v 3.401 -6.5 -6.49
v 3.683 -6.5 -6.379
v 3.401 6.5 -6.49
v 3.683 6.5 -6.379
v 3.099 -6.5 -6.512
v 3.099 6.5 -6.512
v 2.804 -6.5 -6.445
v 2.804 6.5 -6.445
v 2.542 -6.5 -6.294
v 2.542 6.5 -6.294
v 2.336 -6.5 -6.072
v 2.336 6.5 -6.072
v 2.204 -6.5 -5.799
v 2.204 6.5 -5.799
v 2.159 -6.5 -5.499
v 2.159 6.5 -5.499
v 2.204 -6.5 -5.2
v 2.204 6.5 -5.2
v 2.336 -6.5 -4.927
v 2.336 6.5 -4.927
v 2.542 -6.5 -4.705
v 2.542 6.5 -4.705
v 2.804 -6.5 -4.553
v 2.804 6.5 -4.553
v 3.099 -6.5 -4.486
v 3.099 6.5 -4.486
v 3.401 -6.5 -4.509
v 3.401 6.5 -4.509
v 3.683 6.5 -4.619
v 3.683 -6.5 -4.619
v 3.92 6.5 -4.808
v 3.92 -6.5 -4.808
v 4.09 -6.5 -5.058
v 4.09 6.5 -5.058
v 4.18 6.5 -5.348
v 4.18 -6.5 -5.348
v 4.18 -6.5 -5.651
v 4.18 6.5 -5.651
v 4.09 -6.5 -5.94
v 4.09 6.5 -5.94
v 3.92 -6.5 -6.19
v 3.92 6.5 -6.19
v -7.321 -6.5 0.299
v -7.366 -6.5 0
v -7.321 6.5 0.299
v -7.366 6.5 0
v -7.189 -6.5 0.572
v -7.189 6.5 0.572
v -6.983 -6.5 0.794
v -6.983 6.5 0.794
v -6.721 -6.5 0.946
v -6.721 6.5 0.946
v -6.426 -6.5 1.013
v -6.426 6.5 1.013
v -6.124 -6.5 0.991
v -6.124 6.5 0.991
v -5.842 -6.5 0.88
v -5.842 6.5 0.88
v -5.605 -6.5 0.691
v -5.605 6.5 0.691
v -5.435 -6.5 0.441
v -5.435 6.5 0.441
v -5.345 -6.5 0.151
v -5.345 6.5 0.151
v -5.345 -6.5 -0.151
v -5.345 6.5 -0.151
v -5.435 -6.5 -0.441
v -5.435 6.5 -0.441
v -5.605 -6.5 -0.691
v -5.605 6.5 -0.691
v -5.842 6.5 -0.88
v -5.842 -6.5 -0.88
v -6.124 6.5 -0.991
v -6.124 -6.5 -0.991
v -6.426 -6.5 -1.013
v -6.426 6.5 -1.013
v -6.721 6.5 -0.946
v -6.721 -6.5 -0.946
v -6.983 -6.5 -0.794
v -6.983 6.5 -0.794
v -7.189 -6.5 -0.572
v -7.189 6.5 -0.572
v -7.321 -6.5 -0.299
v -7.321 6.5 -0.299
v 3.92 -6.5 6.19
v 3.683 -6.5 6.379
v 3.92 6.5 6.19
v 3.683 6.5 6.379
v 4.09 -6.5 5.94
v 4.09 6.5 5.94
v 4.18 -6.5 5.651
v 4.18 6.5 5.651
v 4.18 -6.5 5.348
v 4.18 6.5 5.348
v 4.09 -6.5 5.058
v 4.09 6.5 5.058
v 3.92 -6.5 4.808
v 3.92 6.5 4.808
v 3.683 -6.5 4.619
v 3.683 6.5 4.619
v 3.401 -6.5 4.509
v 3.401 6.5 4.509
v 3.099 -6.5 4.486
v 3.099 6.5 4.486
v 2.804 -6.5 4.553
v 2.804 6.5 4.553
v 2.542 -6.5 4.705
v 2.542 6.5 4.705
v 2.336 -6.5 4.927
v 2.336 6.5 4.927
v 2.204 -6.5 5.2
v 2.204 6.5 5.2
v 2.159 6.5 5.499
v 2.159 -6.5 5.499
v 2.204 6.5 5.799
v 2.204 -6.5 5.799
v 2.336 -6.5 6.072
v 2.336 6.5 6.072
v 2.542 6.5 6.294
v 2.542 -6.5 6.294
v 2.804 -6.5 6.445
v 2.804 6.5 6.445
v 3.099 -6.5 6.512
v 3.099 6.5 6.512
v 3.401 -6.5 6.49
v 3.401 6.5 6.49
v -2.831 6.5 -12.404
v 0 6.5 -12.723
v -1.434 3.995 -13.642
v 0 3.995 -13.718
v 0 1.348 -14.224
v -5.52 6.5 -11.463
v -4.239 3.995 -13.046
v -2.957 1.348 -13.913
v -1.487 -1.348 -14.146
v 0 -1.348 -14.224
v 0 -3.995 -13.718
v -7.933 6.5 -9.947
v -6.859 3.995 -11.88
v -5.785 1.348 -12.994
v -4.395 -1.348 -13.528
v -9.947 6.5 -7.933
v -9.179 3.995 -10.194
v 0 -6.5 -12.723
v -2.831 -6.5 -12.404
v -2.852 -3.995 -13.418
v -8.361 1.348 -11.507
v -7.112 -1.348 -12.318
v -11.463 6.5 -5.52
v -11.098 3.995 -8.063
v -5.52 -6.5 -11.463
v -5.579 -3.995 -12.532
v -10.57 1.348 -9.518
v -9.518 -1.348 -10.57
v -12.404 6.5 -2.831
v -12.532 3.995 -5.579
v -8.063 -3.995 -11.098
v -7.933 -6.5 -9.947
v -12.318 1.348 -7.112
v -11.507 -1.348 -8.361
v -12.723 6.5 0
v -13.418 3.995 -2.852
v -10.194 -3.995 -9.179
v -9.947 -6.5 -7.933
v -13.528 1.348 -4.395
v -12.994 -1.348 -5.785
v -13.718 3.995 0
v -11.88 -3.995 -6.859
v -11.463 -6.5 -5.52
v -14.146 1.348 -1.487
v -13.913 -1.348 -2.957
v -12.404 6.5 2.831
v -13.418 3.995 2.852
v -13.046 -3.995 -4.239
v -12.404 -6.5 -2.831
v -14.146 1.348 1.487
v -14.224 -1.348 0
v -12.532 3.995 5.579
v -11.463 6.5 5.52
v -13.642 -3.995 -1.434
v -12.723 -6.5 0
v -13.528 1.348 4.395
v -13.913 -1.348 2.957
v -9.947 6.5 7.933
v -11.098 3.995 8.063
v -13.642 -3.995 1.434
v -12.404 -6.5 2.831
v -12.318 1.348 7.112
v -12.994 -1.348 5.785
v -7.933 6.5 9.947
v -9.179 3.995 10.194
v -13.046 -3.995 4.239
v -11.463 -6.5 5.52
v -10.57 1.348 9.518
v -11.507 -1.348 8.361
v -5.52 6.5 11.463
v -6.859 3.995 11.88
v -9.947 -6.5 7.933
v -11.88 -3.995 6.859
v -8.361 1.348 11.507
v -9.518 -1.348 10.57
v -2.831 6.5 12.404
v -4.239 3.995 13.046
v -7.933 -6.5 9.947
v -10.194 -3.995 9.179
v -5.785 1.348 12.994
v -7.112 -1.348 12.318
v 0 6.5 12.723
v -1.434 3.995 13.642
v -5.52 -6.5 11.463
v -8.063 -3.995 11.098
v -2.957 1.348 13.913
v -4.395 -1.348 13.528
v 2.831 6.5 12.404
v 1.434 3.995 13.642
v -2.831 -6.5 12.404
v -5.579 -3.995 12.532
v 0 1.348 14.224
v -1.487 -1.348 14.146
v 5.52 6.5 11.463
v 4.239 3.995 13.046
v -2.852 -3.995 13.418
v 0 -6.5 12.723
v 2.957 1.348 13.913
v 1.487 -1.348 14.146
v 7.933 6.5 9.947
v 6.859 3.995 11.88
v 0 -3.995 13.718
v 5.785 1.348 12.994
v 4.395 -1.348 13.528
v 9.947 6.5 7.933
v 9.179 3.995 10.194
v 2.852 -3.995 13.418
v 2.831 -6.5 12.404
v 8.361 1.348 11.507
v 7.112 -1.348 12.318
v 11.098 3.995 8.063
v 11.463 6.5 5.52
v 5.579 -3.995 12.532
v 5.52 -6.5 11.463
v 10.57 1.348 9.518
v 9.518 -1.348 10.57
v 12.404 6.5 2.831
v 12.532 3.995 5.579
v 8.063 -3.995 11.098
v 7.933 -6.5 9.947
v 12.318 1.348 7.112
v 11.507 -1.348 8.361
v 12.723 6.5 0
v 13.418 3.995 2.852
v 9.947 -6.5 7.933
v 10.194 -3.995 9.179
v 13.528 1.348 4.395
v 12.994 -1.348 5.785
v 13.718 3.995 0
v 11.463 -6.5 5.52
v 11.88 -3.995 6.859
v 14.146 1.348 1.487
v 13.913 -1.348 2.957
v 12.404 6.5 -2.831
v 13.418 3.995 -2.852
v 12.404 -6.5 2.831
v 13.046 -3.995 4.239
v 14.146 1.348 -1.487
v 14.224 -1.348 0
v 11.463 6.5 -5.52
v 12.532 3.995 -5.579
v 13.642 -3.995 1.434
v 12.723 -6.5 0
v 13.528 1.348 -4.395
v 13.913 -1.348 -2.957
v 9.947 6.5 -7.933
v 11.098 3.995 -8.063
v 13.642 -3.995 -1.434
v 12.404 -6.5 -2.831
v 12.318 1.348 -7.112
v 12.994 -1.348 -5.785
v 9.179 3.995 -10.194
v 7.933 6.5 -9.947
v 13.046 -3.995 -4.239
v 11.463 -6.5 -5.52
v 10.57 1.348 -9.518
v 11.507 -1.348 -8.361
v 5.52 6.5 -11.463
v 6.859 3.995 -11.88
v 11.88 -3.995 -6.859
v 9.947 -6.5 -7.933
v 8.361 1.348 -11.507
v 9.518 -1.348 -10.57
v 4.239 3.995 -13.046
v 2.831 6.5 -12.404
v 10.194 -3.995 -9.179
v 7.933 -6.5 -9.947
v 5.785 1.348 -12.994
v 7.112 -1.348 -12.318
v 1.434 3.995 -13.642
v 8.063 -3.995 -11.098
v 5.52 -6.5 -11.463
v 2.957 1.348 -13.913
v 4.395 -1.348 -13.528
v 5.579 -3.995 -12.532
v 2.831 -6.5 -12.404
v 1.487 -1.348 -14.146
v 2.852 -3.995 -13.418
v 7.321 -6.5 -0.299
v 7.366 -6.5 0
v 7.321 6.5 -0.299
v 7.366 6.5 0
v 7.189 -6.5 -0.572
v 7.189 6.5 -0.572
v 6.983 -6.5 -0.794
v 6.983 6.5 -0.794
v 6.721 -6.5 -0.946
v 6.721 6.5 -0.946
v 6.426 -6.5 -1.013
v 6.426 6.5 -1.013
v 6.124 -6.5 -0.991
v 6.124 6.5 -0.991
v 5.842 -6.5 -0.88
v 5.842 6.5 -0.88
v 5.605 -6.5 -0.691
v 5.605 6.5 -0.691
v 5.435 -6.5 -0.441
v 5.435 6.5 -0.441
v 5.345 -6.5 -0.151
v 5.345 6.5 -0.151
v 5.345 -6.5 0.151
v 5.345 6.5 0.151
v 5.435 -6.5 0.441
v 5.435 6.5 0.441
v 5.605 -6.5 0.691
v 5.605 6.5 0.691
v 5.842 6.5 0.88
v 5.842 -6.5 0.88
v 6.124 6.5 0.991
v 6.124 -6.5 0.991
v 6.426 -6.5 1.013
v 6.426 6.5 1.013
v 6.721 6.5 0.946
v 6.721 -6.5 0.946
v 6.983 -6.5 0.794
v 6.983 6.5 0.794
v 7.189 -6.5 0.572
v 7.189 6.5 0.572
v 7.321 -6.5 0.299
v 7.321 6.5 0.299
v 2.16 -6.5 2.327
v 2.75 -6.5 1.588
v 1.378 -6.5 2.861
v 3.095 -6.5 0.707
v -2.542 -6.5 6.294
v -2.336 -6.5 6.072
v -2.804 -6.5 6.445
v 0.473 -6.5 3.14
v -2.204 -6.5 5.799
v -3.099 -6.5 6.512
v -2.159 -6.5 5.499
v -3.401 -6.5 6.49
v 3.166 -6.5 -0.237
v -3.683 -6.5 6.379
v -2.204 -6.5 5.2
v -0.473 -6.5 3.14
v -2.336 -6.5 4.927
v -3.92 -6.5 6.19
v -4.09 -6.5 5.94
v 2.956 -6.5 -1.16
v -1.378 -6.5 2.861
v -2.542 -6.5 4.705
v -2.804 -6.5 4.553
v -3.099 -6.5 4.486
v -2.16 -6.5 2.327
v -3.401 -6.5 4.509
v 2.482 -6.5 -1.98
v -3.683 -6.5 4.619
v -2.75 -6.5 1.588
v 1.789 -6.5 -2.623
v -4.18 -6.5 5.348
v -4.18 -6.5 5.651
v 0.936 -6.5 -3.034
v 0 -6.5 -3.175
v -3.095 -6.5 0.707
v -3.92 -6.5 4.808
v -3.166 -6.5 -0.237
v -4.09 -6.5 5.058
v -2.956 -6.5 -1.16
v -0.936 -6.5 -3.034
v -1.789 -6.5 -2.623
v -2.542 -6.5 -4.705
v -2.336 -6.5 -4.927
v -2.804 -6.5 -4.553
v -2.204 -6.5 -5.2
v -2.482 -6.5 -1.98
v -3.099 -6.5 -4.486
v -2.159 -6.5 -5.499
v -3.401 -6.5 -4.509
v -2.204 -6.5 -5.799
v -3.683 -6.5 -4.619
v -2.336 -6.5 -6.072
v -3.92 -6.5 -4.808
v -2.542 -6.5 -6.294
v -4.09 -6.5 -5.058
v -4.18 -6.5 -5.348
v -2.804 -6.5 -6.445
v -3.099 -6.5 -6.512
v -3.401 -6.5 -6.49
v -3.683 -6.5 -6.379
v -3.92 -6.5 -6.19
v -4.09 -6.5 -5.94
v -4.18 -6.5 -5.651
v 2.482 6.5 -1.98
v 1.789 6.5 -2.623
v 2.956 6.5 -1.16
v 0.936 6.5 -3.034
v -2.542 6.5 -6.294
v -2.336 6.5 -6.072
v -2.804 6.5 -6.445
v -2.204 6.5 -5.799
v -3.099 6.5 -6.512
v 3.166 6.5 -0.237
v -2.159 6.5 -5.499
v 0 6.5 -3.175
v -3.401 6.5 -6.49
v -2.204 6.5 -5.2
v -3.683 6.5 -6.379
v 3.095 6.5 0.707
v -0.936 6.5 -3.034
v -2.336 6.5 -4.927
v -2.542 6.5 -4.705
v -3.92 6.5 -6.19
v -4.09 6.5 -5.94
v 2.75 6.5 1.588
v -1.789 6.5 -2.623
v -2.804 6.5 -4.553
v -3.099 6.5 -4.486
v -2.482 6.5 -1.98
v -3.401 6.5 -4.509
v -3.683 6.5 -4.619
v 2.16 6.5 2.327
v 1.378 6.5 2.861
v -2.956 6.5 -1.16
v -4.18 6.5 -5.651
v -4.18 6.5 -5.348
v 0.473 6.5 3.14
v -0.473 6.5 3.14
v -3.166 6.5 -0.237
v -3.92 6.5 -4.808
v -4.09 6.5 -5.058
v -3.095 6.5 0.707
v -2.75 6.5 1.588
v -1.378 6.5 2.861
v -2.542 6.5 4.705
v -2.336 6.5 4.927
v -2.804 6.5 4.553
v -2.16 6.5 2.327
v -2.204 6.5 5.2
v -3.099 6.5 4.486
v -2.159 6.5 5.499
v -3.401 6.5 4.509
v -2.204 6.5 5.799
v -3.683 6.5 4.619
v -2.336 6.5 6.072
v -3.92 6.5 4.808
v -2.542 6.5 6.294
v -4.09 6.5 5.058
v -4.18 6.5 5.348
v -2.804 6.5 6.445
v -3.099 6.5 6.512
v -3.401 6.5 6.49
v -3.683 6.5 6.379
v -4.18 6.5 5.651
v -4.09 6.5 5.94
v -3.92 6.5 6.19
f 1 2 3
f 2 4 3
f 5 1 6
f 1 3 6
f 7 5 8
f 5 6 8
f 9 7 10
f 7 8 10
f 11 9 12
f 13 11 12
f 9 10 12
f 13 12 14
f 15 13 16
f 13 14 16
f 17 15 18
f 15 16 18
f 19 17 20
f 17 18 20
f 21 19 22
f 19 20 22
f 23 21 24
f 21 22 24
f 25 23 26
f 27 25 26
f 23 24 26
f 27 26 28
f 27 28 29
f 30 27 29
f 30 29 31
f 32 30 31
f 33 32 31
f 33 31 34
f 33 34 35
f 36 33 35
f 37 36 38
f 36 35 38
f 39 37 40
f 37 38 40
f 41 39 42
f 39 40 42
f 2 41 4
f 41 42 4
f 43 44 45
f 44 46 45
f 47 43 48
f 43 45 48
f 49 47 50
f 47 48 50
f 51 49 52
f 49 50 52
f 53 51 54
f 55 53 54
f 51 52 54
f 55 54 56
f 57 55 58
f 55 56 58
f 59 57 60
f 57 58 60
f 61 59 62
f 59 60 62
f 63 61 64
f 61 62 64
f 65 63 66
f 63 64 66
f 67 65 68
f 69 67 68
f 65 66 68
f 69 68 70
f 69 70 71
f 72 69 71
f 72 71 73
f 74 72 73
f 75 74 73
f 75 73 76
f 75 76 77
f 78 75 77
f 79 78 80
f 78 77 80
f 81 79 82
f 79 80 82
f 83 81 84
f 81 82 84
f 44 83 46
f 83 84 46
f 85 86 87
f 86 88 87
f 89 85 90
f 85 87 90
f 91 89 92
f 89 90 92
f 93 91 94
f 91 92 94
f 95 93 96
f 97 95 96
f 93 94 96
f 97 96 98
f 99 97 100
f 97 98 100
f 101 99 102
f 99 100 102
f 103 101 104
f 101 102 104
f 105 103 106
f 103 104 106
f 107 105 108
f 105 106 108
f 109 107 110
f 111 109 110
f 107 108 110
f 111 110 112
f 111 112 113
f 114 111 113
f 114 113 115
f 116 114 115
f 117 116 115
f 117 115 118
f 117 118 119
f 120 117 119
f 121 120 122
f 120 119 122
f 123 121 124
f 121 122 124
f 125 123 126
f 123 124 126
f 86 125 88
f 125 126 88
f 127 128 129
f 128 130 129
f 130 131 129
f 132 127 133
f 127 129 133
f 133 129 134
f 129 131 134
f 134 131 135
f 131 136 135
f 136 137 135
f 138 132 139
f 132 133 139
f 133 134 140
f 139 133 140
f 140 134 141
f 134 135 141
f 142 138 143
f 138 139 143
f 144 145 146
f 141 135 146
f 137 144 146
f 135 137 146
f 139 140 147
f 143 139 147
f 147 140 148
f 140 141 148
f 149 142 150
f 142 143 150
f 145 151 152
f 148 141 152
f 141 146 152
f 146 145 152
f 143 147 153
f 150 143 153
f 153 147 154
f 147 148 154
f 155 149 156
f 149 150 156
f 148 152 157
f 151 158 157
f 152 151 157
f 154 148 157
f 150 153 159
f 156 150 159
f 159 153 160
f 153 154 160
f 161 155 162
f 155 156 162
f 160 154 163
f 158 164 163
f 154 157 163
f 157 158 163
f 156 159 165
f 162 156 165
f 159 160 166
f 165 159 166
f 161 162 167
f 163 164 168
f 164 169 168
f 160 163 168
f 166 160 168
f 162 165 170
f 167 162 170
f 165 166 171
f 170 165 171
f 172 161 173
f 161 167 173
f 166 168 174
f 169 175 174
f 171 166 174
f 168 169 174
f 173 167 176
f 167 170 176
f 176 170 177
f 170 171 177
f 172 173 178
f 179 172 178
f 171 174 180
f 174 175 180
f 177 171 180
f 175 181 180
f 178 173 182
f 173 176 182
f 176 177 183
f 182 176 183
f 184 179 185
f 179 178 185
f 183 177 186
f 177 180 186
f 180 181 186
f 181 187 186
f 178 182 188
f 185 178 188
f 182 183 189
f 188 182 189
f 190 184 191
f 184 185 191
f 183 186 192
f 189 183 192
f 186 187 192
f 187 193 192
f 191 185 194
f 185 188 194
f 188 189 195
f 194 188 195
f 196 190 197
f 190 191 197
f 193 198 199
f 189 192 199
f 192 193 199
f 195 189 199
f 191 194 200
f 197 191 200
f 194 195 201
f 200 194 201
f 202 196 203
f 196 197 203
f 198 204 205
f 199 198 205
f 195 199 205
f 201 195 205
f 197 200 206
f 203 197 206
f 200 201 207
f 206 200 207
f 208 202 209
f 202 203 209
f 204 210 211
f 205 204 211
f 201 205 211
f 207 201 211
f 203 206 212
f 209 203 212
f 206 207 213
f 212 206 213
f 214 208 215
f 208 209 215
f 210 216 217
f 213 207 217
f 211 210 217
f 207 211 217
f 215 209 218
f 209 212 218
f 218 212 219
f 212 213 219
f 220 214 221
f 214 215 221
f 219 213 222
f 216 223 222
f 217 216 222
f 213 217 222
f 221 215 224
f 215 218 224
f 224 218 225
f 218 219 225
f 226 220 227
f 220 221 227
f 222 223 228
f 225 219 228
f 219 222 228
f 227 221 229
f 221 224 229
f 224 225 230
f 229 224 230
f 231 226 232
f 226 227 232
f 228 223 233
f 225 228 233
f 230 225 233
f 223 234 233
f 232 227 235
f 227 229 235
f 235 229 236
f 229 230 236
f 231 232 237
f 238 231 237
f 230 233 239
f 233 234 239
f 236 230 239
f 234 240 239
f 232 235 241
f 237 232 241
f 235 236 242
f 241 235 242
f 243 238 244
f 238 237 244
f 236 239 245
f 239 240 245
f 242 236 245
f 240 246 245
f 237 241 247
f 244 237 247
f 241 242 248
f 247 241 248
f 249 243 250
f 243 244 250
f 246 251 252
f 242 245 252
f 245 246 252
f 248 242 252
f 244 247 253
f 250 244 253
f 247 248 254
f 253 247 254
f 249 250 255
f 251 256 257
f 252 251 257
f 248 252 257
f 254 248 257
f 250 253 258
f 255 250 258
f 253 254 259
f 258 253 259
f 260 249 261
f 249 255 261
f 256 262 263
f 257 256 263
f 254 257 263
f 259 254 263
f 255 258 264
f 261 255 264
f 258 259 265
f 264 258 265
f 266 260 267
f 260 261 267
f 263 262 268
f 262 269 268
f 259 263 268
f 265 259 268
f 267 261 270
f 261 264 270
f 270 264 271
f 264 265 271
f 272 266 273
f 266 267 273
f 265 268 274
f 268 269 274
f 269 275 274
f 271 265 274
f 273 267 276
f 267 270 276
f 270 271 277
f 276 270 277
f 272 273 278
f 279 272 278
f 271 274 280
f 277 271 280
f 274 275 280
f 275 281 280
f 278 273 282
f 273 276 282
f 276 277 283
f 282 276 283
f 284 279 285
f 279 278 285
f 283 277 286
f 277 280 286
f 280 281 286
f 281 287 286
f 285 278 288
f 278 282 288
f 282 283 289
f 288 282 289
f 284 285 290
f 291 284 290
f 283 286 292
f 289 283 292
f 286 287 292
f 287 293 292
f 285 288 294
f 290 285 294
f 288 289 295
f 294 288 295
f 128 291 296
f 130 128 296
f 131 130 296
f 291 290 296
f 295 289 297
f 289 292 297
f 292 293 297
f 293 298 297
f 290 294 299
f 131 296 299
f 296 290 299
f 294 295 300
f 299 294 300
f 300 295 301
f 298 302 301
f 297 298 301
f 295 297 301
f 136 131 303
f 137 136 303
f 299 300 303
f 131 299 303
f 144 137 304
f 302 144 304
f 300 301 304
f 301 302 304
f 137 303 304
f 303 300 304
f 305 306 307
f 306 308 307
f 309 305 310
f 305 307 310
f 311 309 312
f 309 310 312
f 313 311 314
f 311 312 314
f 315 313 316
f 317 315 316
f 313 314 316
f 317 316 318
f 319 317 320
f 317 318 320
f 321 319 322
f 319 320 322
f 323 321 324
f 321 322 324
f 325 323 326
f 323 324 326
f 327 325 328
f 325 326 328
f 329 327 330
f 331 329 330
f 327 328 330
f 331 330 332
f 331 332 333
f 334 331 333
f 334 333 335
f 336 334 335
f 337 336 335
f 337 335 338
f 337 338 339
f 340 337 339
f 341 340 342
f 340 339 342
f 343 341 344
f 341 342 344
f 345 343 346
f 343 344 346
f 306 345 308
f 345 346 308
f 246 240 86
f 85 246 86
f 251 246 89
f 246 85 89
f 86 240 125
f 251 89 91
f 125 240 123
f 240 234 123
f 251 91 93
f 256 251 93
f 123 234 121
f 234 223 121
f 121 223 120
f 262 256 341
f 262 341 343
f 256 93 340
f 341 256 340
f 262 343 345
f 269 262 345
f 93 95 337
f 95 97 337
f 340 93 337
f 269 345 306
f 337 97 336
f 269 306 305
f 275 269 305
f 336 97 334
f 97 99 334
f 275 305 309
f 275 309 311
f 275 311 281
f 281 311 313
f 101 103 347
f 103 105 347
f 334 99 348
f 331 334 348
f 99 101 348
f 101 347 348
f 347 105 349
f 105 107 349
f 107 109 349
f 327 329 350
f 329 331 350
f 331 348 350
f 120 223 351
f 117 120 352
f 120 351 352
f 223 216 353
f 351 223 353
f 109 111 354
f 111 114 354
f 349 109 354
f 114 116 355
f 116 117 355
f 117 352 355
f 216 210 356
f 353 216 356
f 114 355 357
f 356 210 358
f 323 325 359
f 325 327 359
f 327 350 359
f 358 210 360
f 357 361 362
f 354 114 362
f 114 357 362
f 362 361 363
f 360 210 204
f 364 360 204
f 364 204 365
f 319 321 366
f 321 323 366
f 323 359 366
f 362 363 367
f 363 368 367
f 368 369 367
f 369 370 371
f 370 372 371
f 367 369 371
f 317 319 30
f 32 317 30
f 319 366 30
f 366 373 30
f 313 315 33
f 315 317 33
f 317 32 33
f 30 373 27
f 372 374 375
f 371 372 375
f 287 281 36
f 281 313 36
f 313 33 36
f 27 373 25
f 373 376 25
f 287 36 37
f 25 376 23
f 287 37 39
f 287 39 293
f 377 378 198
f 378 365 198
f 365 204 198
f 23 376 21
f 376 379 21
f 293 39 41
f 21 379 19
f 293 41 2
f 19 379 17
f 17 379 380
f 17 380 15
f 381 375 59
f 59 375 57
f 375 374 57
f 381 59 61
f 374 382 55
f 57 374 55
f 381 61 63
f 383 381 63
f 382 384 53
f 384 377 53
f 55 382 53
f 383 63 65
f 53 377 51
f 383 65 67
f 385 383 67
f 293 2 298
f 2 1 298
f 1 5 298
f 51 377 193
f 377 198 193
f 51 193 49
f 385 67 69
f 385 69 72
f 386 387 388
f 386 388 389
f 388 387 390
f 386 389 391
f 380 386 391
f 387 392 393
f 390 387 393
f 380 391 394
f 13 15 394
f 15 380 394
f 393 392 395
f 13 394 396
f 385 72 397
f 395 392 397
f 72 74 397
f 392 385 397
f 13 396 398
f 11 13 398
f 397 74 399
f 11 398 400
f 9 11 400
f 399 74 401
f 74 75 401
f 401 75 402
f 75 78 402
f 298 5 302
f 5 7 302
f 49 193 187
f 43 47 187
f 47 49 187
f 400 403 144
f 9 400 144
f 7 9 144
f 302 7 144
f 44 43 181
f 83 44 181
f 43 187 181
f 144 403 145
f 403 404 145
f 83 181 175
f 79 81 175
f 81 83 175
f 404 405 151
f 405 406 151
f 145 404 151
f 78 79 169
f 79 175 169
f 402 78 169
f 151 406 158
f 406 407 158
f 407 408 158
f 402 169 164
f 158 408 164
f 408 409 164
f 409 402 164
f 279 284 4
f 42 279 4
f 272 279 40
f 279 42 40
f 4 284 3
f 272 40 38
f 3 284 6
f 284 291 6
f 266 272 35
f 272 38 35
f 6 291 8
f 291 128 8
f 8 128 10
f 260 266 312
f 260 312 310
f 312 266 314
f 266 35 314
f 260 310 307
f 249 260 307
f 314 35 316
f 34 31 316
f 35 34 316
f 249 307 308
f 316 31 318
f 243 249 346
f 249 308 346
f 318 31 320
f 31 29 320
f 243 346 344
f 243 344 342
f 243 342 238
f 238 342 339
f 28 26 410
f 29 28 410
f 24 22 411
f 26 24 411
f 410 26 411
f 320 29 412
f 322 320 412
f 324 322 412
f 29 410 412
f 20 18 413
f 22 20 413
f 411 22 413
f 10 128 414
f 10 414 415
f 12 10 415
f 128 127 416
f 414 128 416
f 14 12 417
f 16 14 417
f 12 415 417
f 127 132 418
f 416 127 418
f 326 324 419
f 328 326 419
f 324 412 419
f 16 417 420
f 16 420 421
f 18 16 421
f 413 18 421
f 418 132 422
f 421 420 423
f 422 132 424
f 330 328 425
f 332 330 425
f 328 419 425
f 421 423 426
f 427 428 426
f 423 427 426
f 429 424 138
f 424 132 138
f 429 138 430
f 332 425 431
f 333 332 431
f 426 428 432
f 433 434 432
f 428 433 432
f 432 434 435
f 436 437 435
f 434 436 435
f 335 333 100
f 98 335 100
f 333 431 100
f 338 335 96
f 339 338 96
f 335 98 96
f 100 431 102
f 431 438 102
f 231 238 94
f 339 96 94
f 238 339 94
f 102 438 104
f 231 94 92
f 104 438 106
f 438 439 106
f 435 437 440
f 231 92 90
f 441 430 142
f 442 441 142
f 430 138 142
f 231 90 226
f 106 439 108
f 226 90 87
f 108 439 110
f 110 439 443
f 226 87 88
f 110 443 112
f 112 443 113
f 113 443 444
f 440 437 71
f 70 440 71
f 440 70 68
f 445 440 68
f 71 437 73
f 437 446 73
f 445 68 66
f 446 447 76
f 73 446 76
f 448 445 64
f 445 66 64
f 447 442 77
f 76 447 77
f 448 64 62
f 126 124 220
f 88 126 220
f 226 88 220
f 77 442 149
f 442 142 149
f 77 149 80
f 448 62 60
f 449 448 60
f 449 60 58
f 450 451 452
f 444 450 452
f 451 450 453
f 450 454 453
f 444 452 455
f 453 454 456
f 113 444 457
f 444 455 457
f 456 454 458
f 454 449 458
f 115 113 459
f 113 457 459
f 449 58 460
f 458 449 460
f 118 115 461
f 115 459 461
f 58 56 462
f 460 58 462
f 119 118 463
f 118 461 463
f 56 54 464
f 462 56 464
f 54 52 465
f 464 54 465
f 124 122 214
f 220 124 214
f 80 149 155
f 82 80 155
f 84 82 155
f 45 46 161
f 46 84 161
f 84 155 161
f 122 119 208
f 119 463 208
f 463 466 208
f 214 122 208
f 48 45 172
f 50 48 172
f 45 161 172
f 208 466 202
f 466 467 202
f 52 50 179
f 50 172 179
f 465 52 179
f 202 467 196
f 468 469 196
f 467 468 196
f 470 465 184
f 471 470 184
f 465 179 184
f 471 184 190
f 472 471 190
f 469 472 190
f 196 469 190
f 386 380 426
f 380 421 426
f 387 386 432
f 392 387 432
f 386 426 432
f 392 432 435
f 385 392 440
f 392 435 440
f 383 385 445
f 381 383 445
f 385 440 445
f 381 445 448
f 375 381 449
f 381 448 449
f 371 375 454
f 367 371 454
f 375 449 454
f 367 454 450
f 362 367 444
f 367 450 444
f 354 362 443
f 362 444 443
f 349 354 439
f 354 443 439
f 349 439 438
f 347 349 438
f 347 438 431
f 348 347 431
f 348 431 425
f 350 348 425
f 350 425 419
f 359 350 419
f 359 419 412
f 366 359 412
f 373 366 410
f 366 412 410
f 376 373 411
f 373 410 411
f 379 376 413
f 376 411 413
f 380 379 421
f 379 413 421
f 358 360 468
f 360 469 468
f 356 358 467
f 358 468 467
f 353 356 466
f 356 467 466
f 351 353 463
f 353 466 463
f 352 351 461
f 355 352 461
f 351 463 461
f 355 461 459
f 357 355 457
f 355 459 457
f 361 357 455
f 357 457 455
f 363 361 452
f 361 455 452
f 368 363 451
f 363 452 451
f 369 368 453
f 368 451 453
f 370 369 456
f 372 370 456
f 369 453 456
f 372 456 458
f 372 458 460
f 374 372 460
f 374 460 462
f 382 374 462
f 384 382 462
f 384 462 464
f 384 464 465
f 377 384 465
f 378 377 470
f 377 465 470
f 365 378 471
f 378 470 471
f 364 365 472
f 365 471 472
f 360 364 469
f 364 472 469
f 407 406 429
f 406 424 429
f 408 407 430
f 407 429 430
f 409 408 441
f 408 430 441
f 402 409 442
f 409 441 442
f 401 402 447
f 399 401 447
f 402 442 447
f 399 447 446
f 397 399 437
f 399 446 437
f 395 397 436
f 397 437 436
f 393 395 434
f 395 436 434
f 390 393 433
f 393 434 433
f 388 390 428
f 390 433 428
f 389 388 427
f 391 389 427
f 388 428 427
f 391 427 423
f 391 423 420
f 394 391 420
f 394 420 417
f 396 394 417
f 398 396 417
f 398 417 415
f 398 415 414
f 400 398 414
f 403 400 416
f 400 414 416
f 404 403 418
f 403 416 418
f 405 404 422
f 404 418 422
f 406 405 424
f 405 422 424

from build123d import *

# Parameters (mm, degrees)
SKETCH3_R          = 1.016
CUT_EXTRUDE1_DEPTH = 7.5
CIRPATTERN1_COUNT  = 6


with BuildPart() as part:
    # Sketch1 → Revolve1 (revolve)
    with BuildSketch(Plane(origin=(0, 0, 0), x_dir=(0, 0, -1), z_dir=(1, 0, 0))):
        with BuildLine():
            Line((3.175, 6.5), (12.723311528, 6.5))
            ThreePointArc((12.723311528, 6.5), (14.2875, 0), (12.723311528, -6.5))
            Line((12.723311528, -6.5), (3.175, -6.5))
            Line((3.175, -6.5), (3.175, 6.5))
        make_face()
    revolve(axis=Axis((0, -6.5, 0), (0, 1, 0)))

    # Sketch3 → Cut-Extrude1 (cut, symmetric)
    with BuildSketch(Plane(origin=(0, 0, 0), x_dir=(1, 0, 0), z_dir=(0, 1, 0))):
        with Locations((6.35, 0)):
            Circle(SKETCH3_R)
    cut_extrude1 = extrude(amount=CUT_EXTRUDE1_DEPTH, both=True, mode=Mode.SUBTRACT)

    # CirPattern1: Cut-Extrude1 ×6 about axis
    cirpattern1_axis = Axis((0, 0, 0), (0, 1, 0))
    for i in range(1, CIRPATTERN1_COUNT):
        add(cut_extrude1.rotate(cirpattern1_axis, i * 360 / CIRPATTERN1_COUNT), mode=Mode.SUBTRACT)


solid = part.part
